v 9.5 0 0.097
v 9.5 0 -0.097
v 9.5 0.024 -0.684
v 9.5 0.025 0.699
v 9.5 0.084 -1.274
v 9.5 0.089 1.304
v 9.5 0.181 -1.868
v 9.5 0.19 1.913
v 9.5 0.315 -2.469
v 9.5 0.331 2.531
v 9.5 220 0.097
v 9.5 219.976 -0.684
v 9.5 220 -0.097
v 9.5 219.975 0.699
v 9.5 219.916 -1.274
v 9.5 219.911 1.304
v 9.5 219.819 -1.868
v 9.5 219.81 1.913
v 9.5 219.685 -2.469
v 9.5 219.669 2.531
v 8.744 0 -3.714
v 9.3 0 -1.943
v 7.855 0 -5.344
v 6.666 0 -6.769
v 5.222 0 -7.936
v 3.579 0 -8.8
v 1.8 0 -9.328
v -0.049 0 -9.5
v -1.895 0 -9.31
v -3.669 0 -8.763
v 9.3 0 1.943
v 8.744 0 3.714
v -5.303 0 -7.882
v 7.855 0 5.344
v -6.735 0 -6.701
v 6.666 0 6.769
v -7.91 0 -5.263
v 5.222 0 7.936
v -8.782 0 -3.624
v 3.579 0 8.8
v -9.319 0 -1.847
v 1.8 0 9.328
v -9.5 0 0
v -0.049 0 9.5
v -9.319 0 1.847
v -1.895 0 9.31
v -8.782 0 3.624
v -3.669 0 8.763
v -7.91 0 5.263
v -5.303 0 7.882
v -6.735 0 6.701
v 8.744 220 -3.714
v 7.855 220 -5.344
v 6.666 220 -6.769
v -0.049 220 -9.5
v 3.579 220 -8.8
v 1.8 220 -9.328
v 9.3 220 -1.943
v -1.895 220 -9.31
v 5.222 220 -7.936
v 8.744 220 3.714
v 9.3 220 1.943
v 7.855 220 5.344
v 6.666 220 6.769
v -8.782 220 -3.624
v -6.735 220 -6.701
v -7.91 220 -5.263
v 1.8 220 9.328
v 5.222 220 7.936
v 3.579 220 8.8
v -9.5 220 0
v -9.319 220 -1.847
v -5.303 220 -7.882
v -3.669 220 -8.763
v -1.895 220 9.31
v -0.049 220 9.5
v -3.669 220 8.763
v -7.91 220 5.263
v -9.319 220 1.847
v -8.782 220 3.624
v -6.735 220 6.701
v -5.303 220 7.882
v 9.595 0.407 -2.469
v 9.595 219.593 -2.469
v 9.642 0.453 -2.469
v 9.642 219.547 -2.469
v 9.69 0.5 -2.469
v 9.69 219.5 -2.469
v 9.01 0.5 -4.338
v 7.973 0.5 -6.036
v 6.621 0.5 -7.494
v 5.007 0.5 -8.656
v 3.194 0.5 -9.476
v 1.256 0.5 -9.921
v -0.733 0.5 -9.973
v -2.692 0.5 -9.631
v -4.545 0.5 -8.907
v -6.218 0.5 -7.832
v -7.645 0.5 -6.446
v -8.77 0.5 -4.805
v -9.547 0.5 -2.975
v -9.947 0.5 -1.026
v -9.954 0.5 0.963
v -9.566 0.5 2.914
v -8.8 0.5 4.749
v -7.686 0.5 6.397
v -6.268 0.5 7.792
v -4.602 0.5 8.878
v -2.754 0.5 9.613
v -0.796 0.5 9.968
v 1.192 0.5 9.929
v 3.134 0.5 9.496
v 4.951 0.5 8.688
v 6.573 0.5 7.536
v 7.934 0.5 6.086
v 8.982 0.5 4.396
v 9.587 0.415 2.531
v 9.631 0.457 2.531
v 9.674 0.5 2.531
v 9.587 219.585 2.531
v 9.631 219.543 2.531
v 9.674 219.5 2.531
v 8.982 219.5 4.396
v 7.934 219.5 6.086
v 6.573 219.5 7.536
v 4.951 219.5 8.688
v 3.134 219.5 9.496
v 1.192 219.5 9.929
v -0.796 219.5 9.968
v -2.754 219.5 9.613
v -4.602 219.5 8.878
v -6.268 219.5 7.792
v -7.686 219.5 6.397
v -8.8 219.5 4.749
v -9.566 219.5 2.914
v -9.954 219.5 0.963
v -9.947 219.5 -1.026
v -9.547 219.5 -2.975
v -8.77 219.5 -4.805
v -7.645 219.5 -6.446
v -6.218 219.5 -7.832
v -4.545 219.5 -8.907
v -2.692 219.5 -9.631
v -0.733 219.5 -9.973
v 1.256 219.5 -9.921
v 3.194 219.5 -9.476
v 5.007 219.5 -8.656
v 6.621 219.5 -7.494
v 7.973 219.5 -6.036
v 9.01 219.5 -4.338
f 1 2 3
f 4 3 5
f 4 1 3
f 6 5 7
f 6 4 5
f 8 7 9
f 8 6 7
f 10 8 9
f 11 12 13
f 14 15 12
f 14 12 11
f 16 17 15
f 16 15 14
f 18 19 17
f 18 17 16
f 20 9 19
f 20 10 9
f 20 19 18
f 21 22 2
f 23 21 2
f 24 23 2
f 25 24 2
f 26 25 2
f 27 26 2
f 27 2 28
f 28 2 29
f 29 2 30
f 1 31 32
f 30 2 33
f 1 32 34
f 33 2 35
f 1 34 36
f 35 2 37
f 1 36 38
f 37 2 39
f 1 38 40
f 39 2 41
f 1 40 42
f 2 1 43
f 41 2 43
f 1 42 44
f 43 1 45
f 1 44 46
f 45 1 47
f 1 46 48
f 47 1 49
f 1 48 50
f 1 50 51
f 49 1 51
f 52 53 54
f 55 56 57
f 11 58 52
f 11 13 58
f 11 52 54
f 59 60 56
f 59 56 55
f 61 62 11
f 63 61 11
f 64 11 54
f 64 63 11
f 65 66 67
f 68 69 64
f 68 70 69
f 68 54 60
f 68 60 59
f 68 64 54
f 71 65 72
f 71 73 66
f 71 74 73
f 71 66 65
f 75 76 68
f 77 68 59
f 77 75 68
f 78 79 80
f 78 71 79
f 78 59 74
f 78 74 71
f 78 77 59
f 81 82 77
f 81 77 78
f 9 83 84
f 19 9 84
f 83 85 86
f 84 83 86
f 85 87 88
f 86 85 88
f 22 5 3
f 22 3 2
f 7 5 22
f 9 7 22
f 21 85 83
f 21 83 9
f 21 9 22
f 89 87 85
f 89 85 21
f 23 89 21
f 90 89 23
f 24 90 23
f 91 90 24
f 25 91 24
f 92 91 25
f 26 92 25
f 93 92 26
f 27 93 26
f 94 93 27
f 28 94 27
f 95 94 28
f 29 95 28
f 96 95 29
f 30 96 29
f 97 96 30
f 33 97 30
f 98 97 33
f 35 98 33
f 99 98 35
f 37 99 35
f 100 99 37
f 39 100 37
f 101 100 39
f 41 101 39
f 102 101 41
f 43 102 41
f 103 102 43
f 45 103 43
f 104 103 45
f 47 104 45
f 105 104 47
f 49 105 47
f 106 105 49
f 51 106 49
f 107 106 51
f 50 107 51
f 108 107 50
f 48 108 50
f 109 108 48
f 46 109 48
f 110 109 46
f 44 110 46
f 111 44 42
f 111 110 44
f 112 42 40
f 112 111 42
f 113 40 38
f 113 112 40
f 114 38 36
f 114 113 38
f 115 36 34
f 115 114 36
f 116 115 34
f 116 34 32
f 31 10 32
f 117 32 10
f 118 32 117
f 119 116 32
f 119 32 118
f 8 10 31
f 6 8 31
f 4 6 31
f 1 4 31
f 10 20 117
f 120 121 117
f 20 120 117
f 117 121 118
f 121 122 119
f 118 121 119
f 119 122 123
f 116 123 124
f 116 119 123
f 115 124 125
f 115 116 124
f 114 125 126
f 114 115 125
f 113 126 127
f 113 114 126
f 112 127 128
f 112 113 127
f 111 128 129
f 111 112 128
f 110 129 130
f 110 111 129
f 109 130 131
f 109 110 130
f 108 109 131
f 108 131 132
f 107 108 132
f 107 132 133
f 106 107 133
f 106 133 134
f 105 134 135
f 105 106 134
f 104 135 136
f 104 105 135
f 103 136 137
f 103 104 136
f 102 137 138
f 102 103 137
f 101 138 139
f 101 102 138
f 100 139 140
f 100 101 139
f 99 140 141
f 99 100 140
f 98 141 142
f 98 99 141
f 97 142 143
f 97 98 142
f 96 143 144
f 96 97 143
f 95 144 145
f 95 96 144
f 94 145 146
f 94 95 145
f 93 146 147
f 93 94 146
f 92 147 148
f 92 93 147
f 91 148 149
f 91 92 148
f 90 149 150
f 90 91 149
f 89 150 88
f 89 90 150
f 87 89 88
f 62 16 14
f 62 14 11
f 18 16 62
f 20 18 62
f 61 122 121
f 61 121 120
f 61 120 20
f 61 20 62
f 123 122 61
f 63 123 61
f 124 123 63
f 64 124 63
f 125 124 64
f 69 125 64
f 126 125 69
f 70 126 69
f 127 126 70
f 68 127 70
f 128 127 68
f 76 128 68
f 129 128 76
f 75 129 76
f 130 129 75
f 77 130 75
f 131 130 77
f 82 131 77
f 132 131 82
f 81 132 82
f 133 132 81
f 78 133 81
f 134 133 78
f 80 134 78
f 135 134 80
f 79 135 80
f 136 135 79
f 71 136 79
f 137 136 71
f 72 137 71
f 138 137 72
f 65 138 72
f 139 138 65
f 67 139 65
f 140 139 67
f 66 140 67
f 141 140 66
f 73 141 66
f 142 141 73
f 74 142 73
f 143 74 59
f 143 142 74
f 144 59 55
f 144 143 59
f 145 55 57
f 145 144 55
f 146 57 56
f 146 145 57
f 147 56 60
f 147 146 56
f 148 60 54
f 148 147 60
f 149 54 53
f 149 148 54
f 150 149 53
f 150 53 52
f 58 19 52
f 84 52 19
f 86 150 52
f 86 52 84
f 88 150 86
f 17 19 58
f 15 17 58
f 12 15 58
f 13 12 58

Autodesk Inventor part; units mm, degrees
ref_plane "XZ Plane" through (0, 0, 0) normal (0, 1, 0) x (-1, 0, 0)
ref_plane "XY Plane" through (0, 0, 0) normal (0, 0, 1) x (1, 0, 0)
sketch "Sketch1" plane through (0, 0, 0) normal (0, 1, 0) x (-1, 0, 0)
  circle A0 centre (0, 0) radius 10
  dimension "d0" = 20
extrude "Extrusion1" add sketch "Sketch1" along normal blind 220
ref_plane "Work Plane1" through (10, 0, 0) normal (1, 0, 0) x (0, 1, 0)
sketch "Sketch2" plane through (10, 0, 0) normal (1, 0, 0) x (0, 1, 0)
  line L0 (220, -10) -> (220, 10) projected
  line L1 (0, -10) -> (0, 10) projected
  line L2 (0, 0) -> (132.5, 0)
  circle A0 centre (132.5, 0) radius 1.25
  circle A1 centre (132.5, 0) radius 0.5
  circle A2 centre (132.5, 0.0309) radius 2.5
  line L3 (0, -10) -> (0, 10) projected
  line L4 (132.5, -2.4691) -> (0, -2.4691)
  line L5 (0, -2.4691) -> (0, 2.5309)
  line L6 (0, 2.5309) -> (132.5, 2.5309)
  line L7 (132.5, 2.5309) -> (132.5, -2.4691)
  line L8 (220, -10) -> (220, 10) projected
  line L9 (132.5, -2.4691) -> (220, -2.4691)
  line L10 (220, -2.4691) -> (220, 2.5309)
  line L11 (220, 2.5309) -> (132.5, 2.5309)
  line L12 (132.5, 2.5309) -> (132.5, -2.4691)
  dimension "d21" = 5
  dimension "d3" = 132.5
  dimension "d4" = 2.5
  dimension "d5" = 1
extrude "Extrusion2" cut sketch "Sketch2" against normal blind 0.5
sketch "Sketch3" plane through (9.5, 0, 0) normal (1, 0, 0) x (0, 0, -1)
  line L0 (2.4691, 0) -> (-2.5309, 0) projected
  circle A0 centre (-0.0309, 132.5) radius 0.75
  circle A1 centre (-0.0309, 132.5) radius 1.25
  line L1 (2.4691, 220) -> (2.4691, 0) projected
  line L2 (-2.5309, 220) -> (2.4691, 220) projected
  line L3 (-2.5309, 0) -> (-2.5309, 220) projected
  point P0 (0, 0)
  dimension "d24" = 1.5
  dimension "d25" = 2.5
extrude "Extrusion4" [suppressed]
chamfer "Chamfer5" [suppressed]
chamfer "Chamfer6" distance 0.5 angle 45 2 edges at (-9.9999, 220, -0.0319) (-9.9999, 0, -0.0319)
properties part number "wał_półkola" material "Stainless Steel"
